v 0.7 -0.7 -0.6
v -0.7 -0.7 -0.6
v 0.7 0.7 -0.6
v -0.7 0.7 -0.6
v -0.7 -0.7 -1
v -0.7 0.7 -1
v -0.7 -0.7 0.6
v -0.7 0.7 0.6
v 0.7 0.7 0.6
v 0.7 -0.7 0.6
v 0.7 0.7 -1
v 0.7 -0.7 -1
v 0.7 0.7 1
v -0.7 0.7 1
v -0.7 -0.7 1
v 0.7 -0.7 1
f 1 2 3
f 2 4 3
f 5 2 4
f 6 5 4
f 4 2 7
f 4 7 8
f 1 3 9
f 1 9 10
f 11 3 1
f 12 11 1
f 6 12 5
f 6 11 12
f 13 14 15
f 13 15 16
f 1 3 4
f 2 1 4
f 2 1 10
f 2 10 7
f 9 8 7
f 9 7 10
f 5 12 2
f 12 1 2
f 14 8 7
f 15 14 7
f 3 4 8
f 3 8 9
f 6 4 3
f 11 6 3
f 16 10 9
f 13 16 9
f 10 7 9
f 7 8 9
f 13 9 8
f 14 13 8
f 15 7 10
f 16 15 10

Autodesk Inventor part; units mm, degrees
ref_plane "YZ Plane" through (0, 0, 0) normal (1, 0, 0) x (0, 1, 0)
ref_plane "XZ Plane" through (0, 0, 0) normal (0, 1, 0) x (-1, 0, 0)
ref_plane "XY Plane" through (0, 0, 0) normal (0, 0, 1) x (1, 0, 0)
sketch "Sketch1" plane through (0, 0, 0) normal (0, 0, 1) x (1, 0, 0)
  line L0 (-0.7, 0.7) -> (0.7, 0.7)
  line L1 (0.7, 0.7) -> (0.7, -0.7)
  line L2 (0.7, -0.7) -> (-0.7, -0.7)
  line L3 (-0.7, -0.7) -> (-0.7, 0.7)
  line L4 (-0.7, 0.7) -> (0.7, -0.7) construction
  line L5 (0.7, 0.7) -> (-0.7, -0.7) construction
  point P0 (0, 0)
  dimension "d0" = 1.4
  dimension "d1" = 1.4
extrude "Extrusion1" add sketch "Sketch1" along normal mid plane 1.2
sketch "Sketch2" plane through (0, 0, 0.6) normal (0, 0, 1) x (1, 0, 0)
  line L0 (-0.7, -0.7) -> (0.7, -0.7) projected
  line L1 (0.7, -0.7) -> (0.7, 0.7) projected
  line L2 (0.7, 0.7) -> (-0.7, 0.7) projected
  line L3 (-0.7, 0.7) -> (-0.7, -0.7) projected
  point P0 (0, 0)
extrude "Extrusion2" add sketch "Sketch2" along normal blind 0.4 separate body
mirror "Mirror1" about plane through (0, 0, 0) normal (0, 0, 1) of "Extrusion2" bodies 2
